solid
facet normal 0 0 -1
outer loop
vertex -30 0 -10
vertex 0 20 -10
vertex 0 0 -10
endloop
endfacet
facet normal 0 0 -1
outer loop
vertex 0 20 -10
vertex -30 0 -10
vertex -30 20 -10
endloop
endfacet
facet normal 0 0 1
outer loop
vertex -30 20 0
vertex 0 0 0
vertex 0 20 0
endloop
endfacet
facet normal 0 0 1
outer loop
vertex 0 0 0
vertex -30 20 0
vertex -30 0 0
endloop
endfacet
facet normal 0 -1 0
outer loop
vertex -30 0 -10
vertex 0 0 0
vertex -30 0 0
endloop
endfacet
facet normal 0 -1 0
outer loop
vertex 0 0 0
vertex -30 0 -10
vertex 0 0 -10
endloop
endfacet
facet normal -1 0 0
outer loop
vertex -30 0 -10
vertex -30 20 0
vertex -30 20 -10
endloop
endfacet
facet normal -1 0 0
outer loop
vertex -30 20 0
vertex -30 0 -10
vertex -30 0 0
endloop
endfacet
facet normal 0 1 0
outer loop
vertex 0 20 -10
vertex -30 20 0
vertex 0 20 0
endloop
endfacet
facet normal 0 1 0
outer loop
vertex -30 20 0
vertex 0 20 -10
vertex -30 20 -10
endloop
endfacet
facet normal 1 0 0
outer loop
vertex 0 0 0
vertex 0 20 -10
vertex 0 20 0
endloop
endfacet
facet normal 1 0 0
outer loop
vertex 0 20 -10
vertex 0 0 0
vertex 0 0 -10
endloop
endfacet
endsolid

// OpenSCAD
rotate([0, 180, 0]) cube([30, 20, 10]);
%cube([30, 20, 10]);
